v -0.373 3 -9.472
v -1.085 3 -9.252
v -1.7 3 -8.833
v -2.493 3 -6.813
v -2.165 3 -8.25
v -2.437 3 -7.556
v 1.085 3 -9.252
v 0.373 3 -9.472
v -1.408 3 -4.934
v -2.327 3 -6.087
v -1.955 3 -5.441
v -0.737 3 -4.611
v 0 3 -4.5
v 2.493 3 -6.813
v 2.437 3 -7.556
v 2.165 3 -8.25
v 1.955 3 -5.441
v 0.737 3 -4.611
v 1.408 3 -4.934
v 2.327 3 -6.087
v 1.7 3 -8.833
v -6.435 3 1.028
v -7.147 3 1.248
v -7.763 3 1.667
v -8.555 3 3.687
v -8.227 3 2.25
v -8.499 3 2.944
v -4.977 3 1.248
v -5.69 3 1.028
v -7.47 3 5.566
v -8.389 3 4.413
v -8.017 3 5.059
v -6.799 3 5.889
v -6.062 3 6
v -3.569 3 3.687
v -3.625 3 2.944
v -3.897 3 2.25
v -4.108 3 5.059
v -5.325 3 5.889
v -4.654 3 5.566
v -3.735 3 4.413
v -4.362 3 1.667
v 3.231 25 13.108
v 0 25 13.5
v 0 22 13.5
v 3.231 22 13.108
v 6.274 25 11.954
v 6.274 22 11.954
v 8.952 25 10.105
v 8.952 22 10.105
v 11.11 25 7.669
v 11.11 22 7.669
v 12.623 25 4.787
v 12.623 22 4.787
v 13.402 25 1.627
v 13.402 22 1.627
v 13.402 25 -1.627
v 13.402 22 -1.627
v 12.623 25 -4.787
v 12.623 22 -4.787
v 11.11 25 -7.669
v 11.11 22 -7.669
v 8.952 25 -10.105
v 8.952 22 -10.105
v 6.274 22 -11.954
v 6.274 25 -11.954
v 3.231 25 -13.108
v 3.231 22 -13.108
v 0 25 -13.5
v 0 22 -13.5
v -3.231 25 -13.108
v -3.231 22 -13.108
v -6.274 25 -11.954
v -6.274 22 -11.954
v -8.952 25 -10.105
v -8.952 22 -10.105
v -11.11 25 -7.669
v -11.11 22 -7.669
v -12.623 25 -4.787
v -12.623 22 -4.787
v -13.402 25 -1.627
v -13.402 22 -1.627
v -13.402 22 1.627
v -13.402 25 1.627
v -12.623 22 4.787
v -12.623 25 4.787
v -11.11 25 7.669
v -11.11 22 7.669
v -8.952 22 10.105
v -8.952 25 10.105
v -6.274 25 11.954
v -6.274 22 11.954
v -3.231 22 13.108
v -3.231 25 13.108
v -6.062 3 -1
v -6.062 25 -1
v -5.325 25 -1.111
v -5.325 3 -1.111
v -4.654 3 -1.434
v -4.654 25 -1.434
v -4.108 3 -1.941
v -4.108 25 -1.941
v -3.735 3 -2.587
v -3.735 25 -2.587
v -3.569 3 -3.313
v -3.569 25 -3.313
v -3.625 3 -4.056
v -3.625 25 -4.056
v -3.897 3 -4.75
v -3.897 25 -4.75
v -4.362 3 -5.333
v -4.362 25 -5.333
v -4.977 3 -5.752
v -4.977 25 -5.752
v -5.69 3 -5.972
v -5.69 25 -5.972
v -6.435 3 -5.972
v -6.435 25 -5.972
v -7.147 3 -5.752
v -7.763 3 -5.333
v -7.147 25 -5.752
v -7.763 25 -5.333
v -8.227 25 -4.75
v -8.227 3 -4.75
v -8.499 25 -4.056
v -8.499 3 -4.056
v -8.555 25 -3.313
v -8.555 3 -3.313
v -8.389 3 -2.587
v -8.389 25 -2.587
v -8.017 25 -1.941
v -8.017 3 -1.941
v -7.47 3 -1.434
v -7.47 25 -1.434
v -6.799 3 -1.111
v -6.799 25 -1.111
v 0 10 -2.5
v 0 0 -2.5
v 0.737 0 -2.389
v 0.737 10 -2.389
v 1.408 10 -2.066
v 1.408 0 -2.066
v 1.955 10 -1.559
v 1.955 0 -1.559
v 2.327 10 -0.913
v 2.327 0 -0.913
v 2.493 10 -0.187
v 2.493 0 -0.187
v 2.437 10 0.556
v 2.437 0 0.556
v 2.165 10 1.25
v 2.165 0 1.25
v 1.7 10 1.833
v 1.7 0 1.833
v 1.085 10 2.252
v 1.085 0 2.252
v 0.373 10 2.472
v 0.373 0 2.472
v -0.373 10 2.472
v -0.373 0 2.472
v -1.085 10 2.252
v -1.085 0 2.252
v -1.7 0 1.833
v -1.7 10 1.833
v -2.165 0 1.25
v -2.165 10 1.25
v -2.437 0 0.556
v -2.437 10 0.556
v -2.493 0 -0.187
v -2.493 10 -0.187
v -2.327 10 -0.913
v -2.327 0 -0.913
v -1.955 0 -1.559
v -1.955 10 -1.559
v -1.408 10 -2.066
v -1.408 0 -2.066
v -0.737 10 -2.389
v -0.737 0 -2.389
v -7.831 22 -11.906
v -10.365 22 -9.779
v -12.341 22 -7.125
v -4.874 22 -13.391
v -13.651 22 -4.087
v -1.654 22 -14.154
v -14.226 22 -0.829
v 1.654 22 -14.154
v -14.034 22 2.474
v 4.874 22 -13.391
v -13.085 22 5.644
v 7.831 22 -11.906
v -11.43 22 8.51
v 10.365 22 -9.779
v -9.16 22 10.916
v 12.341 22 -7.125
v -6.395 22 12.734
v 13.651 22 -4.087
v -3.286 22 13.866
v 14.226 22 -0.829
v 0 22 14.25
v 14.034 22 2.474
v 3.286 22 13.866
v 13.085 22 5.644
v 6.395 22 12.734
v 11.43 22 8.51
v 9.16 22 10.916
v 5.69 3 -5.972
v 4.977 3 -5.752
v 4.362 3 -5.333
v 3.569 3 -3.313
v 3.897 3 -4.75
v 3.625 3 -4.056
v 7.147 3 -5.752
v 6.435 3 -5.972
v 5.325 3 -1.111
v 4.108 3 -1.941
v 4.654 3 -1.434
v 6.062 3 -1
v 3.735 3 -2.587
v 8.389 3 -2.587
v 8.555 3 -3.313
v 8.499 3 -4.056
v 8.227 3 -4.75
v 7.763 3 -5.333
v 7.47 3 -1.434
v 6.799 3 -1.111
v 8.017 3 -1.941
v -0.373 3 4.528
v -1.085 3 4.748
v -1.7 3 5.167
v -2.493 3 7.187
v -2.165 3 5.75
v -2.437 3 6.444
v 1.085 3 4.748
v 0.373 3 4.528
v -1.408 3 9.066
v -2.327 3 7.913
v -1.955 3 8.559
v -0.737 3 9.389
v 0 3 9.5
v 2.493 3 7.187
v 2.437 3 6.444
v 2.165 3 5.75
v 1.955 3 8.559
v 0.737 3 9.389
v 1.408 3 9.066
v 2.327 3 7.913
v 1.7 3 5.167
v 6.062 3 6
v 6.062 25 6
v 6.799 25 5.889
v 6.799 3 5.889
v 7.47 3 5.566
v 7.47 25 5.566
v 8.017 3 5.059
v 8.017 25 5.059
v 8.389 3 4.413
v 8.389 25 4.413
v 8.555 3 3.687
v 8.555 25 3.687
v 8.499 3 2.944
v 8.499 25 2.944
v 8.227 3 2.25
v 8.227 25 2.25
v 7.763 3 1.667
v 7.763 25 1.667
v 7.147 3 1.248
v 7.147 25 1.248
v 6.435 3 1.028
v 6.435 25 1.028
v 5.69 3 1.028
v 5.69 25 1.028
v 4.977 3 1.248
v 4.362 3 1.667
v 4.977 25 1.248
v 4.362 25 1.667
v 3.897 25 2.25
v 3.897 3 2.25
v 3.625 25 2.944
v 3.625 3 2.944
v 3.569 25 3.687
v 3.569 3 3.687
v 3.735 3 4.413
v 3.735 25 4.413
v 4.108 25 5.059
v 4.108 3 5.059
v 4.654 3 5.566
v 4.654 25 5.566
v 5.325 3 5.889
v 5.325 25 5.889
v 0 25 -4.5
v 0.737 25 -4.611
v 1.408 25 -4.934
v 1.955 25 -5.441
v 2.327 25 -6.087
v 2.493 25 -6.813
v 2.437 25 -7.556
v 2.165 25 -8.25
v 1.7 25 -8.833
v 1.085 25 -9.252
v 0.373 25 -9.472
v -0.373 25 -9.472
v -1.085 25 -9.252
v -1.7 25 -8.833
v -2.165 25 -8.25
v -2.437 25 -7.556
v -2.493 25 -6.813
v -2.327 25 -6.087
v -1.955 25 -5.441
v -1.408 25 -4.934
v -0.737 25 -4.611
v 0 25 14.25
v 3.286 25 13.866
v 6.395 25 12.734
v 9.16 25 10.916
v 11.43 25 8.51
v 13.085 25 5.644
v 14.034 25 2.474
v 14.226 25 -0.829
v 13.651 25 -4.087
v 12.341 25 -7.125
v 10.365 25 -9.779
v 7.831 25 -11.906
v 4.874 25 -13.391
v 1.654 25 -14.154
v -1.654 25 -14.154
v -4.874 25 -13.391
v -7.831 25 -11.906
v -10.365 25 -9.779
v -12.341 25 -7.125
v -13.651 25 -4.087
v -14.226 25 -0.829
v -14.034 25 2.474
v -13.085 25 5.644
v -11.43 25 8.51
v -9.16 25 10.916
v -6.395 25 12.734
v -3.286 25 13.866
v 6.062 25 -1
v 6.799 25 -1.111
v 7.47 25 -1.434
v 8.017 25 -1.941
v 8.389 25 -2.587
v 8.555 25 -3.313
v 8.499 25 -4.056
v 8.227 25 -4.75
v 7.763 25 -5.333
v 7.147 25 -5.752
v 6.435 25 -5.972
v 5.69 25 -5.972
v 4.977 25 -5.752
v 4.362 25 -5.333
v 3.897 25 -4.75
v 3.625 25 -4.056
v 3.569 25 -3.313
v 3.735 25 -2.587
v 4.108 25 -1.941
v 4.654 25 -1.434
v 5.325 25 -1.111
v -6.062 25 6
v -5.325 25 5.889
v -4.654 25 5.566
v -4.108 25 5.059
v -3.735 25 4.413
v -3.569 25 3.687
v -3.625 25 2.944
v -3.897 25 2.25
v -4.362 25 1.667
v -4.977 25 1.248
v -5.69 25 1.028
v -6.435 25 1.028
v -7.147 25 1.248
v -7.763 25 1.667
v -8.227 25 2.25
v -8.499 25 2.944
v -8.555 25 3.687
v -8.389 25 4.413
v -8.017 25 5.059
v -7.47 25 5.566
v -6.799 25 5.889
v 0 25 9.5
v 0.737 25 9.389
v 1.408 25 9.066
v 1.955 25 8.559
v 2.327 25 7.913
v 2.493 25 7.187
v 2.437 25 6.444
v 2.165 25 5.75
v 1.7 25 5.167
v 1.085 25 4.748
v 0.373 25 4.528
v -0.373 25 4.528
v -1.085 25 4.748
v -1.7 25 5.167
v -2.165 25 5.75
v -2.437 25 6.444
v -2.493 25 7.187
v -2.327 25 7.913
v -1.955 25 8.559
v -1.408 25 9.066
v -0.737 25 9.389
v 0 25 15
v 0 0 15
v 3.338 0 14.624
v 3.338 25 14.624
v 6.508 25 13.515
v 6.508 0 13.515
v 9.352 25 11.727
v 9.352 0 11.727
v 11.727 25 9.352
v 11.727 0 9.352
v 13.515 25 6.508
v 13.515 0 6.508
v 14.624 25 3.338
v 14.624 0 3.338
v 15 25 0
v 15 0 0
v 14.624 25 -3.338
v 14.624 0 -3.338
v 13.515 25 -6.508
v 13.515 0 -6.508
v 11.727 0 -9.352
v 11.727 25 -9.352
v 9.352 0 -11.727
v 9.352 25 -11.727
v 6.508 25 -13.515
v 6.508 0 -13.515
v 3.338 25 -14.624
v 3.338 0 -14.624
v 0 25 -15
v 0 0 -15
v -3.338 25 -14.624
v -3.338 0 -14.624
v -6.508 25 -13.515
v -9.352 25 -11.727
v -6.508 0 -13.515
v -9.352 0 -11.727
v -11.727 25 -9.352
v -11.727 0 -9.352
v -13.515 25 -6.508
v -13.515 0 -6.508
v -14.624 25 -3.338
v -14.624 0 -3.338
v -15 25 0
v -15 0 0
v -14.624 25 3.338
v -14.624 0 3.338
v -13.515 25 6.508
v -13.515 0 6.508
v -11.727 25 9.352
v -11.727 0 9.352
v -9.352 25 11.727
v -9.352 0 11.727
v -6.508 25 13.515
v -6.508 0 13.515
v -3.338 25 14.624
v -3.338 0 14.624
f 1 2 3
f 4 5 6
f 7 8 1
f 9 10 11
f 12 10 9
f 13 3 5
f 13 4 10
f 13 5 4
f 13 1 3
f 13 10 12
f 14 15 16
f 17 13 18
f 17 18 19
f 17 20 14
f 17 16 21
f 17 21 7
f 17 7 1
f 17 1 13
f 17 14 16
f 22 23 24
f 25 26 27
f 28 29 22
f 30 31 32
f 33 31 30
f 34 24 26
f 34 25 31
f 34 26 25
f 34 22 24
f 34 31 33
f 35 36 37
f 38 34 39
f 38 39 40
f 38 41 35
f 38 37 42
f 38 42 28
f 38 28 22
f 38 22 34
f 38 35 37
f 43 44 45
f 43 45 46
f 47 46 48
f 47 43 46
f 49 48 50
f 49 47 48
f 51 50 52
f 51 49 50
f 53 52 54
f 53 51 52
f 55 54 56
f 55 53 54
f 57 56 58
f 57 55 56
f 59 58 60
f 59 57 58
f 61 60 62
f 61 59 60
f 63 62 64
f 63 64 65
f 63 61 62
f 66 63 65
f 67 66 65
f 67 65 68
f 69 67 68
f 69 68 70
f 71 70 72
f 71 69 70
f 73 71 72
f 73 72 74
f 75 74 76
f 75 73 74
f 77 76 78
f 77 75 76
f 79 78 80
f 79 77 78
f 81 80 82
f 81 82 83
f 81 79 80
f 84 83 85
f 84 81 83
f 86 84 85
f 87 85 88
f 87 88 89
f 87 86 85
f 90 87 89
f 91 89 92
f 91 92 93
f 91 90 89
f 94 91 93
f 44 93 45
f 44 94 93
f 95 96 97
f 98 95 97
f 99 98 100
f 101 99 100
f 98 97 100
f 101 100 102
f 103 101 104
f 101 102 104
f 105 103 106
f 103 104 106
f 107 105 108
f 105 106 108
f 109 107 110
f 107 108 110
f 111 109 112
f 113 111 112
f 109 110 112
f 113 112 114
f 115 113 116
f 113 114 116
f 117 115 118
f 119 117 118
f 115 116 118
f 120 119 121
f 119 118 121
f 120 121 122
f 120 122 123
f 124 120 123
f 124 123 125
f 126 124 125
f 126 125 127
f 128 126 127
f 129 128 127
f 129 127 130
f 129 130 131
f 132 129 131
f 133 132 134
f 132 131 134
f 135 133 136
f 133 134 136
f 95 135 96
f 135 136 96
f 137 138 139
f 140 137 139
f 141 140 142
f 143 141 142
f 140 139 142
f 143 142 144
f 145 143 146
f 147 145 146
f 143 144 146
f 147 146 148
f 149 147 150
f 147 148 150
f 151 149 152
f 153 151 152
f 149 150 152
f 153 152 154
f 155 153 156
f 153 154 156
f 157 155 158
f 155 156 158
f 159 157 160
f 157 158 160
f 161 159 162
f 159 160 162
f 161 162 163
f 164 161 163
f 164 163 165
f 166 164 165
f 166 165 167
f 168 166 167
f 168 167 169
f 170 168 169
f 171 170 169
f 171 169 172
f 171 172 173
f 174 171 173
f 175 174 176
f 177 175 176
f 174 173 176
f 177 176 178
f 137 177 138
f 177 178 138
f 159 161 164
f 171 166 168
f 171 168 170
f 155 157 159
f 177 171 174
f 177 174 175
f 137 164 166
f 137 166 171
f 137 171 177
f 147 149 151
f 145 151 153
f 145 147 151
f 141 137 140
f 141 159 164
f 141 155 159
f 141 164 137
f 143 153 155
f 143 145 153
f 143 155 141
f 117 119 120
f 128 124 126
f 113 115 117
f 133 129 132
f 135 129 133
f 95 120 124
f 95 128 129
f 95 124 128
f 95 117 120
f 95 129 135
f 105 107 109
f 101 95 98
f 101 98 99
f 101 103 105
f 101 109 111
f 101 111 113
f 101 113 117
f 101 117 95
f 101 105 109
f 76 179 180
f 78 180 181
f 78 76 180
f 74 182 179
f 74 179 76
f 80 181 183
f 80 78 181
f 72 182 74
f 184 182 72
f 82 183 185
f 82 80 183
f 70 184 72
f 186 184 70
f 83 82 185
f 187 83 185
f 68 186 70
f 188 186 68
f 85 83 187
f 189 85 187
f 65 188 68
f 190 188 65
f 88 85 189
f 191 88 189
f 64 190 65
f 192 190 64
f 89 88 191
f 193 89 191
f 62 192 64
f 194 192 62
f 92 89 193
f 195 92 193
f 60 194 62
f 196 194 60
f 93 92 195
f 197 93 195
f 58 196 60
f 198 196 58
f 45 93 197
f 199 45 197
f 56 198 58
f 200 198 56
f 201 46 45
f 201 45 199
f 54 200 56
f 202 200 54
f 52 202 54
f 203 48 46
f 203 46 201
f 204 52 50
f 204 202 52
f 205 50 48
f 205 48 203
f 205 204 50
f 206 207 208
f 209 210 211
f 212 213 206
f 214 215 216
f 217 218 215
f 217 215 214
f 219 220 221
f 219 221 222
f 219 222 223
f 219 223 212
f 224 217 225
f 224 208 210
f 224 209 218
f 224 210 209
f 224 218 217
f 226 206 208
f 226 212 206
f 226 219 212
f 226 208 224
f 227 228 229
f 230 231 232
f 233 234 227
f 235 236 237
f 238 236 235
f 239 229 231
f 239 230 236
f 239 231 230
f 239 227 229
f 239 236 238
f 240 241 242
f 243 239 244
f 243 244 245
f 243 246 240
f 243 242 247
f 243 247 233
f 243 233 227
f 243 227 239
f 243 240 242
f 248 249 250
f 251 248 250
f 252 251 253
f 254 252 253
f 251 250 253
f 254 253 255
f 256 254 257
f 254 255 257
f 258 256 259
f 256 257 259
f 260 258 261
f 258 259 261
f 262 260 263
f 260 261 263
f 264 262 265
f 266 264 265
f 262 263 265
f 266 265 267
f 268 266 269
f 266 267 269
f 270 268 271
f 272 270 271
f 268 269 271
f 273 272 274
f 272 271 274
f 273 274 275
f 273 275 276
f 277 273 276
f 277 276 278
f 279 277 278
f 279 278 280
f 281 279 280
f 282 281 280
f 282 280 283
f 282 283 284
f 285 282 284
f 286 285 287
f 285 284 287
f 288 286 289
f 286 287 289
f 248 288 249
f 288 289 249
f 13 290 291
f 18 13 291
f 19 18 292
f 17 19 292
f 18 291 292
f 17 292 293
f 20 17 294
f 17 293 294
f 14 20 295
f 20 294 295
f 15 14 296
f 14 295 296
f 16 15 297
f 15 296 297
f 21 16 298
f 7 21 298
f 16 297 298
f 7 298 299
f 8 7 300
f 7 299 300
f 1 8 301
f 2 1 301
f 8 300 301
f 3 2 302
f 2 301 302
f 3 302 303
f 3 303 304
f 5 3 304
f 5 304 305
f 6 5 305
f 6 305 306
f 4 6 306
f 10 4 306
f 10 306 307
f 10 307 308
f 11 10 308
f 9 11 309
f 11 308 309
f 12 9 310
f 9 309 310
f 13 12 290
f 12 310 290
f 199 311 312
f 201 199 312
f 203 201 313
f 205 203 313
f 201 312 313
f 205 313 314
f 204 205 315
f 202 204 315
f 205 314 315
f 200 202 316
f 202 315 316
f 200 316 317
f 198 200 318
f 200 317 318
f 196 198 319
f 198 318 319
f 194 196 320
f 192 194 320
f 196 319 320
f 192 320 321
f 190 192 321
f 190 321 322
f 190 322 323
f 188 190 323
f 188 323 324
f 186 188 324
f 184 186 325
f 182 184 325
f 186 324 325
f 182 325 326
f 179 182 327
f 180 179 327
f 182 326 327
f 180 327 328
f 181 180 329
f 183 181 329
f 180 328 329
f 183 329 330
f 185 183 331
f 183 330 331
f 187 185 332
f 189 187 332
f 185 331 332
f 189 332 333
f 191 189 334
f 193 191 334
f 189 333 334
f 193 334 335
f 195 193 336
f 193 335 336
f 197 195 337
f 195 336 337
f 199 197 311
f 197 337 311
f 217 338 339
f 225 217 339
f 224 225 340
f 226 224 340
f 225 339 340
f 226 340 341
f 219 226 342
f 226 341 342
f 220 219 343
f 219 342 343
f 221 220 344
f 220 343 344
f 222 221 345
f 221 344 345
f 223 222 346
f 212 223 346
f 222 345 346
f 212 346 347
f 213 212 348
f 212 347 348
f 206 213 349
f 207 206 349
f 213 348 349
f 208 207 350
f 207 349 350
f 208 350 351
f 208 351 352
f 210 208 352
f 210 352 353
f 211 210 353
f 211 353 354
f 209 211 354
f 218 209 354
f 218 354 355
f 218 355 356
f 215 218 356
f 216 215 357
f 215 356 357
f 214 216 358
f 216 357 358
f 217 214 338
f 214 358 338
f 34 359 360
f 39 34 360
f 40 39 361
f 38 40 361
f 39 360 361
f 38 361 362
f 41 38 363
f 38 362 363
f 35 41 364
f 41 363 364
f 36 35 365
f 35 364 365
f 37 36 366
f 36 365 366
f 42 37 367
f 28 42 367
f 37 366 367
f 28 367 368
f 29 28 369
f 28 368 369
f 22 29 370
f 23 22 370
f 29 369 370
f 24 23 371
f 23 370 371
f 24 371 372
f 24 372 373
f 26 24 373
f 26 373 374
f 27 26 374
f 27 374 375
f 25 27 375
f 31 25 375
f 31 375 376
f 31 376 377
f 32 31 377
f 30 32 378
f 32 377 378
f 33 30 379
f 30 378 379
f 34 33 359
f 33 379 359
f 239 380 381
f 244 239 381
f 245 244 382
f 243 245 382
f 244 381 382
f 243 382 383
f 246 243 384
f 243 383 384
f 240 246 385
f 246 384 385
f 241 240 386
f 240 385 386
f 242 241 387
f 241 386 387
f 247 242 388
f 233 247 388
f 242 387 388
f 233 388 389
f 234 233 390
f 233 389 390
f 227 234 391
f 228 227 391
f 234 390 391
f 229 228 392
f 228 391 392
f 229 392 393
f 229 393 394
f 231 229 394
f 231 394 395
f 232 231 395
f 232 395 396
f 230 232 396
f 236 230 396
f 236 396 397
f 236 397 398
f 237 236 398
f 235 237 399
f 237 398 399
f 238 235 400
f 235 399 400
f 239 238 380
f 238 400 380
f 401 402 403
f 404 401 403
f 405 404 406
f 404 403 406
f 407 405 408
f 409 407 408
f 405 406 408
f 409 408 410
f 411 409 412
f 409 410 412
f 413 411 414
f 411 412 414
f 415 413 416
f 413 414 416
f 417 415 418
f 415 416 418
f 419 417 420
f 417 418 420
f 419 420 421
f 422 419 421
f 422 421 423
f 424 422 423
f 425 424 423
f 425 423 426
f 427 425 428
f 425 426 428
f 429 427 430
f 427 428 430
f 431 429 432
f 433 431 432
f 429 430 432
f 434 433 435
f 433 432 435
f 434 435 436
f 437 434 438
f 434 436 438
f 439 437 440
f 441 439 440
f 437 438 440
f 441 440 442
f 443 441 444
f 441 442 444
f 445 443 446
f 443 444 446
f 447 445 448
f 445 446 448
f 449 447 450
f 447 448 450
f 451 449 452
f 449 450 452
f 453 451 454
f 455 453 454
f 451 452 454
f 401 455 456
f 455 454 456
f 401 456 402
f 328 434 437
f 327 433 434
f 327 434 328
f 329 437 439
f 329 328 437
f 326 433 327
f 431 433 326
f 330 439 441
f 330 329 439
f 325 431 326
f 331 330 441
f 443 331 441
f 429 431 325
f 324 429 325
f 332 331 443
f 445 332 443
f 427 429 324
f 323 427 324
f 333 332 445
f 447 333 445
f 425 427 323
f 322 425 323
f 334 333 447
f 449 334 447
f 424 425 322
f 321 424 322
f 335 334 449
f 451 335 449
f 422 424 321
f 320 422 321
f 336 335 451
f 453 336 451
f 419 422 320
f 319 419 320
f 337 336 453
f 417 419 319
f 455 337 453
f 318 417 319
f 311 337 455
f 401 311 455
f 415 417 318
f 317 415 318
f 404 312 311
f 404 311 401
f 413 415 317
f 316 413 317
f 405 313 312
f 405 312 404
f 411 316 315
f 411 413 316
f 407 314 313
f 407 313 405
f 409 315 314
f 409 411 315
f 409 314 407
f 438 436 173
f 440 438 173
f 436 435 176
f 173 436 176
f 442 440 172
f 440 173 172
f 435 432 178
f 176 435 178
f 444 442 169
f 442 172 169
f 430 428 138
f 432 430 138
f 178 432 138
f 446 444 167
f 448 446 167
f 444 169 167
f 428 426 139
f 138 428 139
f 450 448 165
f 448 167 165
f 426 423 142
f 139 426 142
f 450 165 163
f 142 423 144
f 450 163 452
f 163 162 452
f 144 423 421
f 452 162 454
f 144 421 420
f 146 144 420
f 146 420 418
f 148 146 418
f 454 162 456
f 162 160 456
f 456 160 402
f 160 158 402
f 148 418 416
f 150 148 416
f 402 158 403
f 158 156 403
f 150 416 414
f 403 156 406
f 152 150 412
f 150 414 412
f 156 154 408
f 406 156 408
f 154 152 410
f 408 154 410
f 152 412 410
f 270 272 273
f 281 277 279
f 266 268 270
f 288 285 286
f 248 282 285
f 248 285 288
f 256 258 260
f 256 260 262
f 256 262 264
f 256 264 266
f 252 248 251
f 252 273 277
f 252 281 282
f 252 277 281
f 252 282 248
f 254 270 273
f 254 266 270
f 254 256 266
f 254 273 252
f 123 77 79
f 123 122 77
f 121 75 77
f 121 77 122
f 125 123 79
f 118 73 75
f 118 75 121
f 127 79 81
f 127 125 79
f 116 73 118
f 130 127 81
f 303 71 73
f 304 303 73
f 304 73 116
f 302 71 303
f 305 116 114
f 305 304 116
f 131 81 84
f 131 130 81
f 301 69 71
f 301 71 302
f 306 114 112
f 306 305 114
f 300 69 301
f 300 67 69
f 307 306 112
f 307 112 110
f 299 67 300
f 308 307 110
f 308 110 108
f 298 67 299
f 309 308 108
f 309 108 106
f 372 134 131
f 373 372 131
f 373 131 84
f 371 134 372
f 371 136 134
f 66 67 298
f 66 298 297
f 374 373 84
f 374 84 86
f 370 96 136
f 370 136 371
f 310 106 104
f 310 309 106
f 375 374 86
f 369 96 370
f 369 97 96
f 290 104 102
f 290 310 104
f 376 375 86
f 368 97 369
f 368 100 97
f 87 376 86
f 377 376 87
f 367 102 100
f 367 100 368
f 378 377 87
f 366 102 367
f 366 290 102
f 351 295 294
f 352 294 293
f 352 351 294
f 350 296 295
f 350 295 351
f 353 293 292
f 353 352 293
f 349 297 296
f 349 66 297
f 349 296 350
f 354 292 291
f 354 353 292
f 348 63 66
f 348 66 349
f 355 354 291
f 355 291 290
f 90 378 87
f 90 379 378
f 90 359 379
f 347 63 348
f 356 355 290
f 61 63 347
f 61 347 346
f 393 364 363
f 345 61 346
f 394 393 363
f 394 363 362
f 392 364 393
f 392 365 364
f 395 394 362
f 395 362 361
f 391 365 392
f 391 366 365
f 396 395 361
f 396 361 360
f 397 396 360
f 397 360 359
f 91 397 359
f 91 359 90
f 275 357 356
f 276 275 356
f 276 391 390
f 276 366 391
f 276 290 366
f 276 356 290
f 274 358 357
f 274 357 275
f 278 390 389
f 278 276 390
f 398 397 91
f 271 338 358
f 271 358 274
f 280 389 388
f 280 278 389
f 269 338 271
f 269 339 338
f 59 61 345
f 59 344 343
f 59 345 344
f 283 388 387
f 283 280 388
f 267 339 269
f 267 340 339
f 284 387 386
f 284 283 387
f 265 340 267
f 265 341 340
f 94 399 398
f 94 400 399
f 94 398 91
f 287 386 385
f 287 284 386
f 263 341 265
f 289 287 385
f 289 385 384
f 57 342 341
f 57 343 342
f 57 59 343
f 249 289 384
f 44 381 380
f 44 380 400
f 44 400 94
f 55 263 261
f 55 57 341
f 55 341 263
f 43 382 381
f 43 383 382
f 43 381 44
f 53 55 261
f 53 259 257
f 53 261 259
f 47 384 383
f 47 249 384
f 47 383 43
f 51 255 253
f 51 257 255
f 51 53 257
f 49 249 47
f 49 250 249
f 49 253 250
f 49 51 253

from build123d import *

# Parameters (mm, degrees)
SKETCH1_R           = 15
BOSS_EXTRUDE1_DEPTH = 25
SKETCH4_R           = 14.25
SKETCH4_R_2         = 13.5
CUT_EXTRUDE2_DEPTH  = 3
SKETCH5_R           = 2.5
CUT_EXTRUDE3_DEPTH  = 22
SKETCH6_R           = 2.5
CUT_EXTRUDE4_DEPTH  = 10


with BuildPart() as part:
    # Sketch1 → Boss-Extrude1 (new body)
    with BuildSketch(Plane(origin=(0, 0, 0), x_dir=(1, 0, 0), z_dir=(0, 1, 0))):
        with Locations(Location((0, 0, 0), (0, 0, 270))):
            Circle(SKETCH1_R)
    extrude(amount=BOSS_EXTRUDE1_DEPTH)

    # Sketch4 → Cut-Extrude2 (cut)
    with BuildSketch(Plane(origin=(0, 25, 0), x_dir=(1, 0, 0), z_dir=(0, 1, 0))):
        with Locations(Location((0, 0, 0), (0, 0, 270))):
            Circle(SKETCH4_R)
        with Locations(Location((0, 0, 0), (0, 0, 270))):
            Circle(SKETCH4_R_2, mode=Mode.SUBTRACT)
    extrude(amount=-CUT_EXTRUDE2_DEPTH, mode=Mode.SUBTRACT)

    # Sketch5 → Cut-Extrude3 (cut)
    with BuildSketch(Plane(origin=(0, 25, 0), x_dir=(1, 0, 0), z_dir=(0, 1, 0))):
        with Locations(Location((0, 7, 0), (0, 0, 270))):
            Circle(SKETCH5_R)
        with Locations(Location((6.062177826, 3.5, 0), (0, 0, 270))):
            Circle(SKETCH5_R)
        with Locations(Location((6.062177826, -3.5, 0), (0, 0, 270))):
            Circle(SKETCH5_R)
        with Locations(Location((0, -7, 0), (0, 0, 270))):
            Circle(SKETCH5_R)
        with Locations(Location((-6.062177826, -3.5, 0), (0, 0, 270))):
            Circle(SKETCH5_R)
        with Locations(Location((-6.062177826, 3.5, 0), (0, 0, 270))):
            Circle(SKETCH5_R)
    extrude(amount=-CUT_EXTRUDE3_DEPTH, mode=Mode.SUBTRACT)

    # Sketch6 → Cut-Extrude4 (cut)
    with BuildSketch(Plane.XZ):
        with Locations(Location((0, 0, 0), (0, 0, 270))):
            Circle(SKETCH6_R)
    extrude(amount=-CUT_EXTRUDE4_DEPTH, mode=Mode.SUBTRACT)


solid = part.part
